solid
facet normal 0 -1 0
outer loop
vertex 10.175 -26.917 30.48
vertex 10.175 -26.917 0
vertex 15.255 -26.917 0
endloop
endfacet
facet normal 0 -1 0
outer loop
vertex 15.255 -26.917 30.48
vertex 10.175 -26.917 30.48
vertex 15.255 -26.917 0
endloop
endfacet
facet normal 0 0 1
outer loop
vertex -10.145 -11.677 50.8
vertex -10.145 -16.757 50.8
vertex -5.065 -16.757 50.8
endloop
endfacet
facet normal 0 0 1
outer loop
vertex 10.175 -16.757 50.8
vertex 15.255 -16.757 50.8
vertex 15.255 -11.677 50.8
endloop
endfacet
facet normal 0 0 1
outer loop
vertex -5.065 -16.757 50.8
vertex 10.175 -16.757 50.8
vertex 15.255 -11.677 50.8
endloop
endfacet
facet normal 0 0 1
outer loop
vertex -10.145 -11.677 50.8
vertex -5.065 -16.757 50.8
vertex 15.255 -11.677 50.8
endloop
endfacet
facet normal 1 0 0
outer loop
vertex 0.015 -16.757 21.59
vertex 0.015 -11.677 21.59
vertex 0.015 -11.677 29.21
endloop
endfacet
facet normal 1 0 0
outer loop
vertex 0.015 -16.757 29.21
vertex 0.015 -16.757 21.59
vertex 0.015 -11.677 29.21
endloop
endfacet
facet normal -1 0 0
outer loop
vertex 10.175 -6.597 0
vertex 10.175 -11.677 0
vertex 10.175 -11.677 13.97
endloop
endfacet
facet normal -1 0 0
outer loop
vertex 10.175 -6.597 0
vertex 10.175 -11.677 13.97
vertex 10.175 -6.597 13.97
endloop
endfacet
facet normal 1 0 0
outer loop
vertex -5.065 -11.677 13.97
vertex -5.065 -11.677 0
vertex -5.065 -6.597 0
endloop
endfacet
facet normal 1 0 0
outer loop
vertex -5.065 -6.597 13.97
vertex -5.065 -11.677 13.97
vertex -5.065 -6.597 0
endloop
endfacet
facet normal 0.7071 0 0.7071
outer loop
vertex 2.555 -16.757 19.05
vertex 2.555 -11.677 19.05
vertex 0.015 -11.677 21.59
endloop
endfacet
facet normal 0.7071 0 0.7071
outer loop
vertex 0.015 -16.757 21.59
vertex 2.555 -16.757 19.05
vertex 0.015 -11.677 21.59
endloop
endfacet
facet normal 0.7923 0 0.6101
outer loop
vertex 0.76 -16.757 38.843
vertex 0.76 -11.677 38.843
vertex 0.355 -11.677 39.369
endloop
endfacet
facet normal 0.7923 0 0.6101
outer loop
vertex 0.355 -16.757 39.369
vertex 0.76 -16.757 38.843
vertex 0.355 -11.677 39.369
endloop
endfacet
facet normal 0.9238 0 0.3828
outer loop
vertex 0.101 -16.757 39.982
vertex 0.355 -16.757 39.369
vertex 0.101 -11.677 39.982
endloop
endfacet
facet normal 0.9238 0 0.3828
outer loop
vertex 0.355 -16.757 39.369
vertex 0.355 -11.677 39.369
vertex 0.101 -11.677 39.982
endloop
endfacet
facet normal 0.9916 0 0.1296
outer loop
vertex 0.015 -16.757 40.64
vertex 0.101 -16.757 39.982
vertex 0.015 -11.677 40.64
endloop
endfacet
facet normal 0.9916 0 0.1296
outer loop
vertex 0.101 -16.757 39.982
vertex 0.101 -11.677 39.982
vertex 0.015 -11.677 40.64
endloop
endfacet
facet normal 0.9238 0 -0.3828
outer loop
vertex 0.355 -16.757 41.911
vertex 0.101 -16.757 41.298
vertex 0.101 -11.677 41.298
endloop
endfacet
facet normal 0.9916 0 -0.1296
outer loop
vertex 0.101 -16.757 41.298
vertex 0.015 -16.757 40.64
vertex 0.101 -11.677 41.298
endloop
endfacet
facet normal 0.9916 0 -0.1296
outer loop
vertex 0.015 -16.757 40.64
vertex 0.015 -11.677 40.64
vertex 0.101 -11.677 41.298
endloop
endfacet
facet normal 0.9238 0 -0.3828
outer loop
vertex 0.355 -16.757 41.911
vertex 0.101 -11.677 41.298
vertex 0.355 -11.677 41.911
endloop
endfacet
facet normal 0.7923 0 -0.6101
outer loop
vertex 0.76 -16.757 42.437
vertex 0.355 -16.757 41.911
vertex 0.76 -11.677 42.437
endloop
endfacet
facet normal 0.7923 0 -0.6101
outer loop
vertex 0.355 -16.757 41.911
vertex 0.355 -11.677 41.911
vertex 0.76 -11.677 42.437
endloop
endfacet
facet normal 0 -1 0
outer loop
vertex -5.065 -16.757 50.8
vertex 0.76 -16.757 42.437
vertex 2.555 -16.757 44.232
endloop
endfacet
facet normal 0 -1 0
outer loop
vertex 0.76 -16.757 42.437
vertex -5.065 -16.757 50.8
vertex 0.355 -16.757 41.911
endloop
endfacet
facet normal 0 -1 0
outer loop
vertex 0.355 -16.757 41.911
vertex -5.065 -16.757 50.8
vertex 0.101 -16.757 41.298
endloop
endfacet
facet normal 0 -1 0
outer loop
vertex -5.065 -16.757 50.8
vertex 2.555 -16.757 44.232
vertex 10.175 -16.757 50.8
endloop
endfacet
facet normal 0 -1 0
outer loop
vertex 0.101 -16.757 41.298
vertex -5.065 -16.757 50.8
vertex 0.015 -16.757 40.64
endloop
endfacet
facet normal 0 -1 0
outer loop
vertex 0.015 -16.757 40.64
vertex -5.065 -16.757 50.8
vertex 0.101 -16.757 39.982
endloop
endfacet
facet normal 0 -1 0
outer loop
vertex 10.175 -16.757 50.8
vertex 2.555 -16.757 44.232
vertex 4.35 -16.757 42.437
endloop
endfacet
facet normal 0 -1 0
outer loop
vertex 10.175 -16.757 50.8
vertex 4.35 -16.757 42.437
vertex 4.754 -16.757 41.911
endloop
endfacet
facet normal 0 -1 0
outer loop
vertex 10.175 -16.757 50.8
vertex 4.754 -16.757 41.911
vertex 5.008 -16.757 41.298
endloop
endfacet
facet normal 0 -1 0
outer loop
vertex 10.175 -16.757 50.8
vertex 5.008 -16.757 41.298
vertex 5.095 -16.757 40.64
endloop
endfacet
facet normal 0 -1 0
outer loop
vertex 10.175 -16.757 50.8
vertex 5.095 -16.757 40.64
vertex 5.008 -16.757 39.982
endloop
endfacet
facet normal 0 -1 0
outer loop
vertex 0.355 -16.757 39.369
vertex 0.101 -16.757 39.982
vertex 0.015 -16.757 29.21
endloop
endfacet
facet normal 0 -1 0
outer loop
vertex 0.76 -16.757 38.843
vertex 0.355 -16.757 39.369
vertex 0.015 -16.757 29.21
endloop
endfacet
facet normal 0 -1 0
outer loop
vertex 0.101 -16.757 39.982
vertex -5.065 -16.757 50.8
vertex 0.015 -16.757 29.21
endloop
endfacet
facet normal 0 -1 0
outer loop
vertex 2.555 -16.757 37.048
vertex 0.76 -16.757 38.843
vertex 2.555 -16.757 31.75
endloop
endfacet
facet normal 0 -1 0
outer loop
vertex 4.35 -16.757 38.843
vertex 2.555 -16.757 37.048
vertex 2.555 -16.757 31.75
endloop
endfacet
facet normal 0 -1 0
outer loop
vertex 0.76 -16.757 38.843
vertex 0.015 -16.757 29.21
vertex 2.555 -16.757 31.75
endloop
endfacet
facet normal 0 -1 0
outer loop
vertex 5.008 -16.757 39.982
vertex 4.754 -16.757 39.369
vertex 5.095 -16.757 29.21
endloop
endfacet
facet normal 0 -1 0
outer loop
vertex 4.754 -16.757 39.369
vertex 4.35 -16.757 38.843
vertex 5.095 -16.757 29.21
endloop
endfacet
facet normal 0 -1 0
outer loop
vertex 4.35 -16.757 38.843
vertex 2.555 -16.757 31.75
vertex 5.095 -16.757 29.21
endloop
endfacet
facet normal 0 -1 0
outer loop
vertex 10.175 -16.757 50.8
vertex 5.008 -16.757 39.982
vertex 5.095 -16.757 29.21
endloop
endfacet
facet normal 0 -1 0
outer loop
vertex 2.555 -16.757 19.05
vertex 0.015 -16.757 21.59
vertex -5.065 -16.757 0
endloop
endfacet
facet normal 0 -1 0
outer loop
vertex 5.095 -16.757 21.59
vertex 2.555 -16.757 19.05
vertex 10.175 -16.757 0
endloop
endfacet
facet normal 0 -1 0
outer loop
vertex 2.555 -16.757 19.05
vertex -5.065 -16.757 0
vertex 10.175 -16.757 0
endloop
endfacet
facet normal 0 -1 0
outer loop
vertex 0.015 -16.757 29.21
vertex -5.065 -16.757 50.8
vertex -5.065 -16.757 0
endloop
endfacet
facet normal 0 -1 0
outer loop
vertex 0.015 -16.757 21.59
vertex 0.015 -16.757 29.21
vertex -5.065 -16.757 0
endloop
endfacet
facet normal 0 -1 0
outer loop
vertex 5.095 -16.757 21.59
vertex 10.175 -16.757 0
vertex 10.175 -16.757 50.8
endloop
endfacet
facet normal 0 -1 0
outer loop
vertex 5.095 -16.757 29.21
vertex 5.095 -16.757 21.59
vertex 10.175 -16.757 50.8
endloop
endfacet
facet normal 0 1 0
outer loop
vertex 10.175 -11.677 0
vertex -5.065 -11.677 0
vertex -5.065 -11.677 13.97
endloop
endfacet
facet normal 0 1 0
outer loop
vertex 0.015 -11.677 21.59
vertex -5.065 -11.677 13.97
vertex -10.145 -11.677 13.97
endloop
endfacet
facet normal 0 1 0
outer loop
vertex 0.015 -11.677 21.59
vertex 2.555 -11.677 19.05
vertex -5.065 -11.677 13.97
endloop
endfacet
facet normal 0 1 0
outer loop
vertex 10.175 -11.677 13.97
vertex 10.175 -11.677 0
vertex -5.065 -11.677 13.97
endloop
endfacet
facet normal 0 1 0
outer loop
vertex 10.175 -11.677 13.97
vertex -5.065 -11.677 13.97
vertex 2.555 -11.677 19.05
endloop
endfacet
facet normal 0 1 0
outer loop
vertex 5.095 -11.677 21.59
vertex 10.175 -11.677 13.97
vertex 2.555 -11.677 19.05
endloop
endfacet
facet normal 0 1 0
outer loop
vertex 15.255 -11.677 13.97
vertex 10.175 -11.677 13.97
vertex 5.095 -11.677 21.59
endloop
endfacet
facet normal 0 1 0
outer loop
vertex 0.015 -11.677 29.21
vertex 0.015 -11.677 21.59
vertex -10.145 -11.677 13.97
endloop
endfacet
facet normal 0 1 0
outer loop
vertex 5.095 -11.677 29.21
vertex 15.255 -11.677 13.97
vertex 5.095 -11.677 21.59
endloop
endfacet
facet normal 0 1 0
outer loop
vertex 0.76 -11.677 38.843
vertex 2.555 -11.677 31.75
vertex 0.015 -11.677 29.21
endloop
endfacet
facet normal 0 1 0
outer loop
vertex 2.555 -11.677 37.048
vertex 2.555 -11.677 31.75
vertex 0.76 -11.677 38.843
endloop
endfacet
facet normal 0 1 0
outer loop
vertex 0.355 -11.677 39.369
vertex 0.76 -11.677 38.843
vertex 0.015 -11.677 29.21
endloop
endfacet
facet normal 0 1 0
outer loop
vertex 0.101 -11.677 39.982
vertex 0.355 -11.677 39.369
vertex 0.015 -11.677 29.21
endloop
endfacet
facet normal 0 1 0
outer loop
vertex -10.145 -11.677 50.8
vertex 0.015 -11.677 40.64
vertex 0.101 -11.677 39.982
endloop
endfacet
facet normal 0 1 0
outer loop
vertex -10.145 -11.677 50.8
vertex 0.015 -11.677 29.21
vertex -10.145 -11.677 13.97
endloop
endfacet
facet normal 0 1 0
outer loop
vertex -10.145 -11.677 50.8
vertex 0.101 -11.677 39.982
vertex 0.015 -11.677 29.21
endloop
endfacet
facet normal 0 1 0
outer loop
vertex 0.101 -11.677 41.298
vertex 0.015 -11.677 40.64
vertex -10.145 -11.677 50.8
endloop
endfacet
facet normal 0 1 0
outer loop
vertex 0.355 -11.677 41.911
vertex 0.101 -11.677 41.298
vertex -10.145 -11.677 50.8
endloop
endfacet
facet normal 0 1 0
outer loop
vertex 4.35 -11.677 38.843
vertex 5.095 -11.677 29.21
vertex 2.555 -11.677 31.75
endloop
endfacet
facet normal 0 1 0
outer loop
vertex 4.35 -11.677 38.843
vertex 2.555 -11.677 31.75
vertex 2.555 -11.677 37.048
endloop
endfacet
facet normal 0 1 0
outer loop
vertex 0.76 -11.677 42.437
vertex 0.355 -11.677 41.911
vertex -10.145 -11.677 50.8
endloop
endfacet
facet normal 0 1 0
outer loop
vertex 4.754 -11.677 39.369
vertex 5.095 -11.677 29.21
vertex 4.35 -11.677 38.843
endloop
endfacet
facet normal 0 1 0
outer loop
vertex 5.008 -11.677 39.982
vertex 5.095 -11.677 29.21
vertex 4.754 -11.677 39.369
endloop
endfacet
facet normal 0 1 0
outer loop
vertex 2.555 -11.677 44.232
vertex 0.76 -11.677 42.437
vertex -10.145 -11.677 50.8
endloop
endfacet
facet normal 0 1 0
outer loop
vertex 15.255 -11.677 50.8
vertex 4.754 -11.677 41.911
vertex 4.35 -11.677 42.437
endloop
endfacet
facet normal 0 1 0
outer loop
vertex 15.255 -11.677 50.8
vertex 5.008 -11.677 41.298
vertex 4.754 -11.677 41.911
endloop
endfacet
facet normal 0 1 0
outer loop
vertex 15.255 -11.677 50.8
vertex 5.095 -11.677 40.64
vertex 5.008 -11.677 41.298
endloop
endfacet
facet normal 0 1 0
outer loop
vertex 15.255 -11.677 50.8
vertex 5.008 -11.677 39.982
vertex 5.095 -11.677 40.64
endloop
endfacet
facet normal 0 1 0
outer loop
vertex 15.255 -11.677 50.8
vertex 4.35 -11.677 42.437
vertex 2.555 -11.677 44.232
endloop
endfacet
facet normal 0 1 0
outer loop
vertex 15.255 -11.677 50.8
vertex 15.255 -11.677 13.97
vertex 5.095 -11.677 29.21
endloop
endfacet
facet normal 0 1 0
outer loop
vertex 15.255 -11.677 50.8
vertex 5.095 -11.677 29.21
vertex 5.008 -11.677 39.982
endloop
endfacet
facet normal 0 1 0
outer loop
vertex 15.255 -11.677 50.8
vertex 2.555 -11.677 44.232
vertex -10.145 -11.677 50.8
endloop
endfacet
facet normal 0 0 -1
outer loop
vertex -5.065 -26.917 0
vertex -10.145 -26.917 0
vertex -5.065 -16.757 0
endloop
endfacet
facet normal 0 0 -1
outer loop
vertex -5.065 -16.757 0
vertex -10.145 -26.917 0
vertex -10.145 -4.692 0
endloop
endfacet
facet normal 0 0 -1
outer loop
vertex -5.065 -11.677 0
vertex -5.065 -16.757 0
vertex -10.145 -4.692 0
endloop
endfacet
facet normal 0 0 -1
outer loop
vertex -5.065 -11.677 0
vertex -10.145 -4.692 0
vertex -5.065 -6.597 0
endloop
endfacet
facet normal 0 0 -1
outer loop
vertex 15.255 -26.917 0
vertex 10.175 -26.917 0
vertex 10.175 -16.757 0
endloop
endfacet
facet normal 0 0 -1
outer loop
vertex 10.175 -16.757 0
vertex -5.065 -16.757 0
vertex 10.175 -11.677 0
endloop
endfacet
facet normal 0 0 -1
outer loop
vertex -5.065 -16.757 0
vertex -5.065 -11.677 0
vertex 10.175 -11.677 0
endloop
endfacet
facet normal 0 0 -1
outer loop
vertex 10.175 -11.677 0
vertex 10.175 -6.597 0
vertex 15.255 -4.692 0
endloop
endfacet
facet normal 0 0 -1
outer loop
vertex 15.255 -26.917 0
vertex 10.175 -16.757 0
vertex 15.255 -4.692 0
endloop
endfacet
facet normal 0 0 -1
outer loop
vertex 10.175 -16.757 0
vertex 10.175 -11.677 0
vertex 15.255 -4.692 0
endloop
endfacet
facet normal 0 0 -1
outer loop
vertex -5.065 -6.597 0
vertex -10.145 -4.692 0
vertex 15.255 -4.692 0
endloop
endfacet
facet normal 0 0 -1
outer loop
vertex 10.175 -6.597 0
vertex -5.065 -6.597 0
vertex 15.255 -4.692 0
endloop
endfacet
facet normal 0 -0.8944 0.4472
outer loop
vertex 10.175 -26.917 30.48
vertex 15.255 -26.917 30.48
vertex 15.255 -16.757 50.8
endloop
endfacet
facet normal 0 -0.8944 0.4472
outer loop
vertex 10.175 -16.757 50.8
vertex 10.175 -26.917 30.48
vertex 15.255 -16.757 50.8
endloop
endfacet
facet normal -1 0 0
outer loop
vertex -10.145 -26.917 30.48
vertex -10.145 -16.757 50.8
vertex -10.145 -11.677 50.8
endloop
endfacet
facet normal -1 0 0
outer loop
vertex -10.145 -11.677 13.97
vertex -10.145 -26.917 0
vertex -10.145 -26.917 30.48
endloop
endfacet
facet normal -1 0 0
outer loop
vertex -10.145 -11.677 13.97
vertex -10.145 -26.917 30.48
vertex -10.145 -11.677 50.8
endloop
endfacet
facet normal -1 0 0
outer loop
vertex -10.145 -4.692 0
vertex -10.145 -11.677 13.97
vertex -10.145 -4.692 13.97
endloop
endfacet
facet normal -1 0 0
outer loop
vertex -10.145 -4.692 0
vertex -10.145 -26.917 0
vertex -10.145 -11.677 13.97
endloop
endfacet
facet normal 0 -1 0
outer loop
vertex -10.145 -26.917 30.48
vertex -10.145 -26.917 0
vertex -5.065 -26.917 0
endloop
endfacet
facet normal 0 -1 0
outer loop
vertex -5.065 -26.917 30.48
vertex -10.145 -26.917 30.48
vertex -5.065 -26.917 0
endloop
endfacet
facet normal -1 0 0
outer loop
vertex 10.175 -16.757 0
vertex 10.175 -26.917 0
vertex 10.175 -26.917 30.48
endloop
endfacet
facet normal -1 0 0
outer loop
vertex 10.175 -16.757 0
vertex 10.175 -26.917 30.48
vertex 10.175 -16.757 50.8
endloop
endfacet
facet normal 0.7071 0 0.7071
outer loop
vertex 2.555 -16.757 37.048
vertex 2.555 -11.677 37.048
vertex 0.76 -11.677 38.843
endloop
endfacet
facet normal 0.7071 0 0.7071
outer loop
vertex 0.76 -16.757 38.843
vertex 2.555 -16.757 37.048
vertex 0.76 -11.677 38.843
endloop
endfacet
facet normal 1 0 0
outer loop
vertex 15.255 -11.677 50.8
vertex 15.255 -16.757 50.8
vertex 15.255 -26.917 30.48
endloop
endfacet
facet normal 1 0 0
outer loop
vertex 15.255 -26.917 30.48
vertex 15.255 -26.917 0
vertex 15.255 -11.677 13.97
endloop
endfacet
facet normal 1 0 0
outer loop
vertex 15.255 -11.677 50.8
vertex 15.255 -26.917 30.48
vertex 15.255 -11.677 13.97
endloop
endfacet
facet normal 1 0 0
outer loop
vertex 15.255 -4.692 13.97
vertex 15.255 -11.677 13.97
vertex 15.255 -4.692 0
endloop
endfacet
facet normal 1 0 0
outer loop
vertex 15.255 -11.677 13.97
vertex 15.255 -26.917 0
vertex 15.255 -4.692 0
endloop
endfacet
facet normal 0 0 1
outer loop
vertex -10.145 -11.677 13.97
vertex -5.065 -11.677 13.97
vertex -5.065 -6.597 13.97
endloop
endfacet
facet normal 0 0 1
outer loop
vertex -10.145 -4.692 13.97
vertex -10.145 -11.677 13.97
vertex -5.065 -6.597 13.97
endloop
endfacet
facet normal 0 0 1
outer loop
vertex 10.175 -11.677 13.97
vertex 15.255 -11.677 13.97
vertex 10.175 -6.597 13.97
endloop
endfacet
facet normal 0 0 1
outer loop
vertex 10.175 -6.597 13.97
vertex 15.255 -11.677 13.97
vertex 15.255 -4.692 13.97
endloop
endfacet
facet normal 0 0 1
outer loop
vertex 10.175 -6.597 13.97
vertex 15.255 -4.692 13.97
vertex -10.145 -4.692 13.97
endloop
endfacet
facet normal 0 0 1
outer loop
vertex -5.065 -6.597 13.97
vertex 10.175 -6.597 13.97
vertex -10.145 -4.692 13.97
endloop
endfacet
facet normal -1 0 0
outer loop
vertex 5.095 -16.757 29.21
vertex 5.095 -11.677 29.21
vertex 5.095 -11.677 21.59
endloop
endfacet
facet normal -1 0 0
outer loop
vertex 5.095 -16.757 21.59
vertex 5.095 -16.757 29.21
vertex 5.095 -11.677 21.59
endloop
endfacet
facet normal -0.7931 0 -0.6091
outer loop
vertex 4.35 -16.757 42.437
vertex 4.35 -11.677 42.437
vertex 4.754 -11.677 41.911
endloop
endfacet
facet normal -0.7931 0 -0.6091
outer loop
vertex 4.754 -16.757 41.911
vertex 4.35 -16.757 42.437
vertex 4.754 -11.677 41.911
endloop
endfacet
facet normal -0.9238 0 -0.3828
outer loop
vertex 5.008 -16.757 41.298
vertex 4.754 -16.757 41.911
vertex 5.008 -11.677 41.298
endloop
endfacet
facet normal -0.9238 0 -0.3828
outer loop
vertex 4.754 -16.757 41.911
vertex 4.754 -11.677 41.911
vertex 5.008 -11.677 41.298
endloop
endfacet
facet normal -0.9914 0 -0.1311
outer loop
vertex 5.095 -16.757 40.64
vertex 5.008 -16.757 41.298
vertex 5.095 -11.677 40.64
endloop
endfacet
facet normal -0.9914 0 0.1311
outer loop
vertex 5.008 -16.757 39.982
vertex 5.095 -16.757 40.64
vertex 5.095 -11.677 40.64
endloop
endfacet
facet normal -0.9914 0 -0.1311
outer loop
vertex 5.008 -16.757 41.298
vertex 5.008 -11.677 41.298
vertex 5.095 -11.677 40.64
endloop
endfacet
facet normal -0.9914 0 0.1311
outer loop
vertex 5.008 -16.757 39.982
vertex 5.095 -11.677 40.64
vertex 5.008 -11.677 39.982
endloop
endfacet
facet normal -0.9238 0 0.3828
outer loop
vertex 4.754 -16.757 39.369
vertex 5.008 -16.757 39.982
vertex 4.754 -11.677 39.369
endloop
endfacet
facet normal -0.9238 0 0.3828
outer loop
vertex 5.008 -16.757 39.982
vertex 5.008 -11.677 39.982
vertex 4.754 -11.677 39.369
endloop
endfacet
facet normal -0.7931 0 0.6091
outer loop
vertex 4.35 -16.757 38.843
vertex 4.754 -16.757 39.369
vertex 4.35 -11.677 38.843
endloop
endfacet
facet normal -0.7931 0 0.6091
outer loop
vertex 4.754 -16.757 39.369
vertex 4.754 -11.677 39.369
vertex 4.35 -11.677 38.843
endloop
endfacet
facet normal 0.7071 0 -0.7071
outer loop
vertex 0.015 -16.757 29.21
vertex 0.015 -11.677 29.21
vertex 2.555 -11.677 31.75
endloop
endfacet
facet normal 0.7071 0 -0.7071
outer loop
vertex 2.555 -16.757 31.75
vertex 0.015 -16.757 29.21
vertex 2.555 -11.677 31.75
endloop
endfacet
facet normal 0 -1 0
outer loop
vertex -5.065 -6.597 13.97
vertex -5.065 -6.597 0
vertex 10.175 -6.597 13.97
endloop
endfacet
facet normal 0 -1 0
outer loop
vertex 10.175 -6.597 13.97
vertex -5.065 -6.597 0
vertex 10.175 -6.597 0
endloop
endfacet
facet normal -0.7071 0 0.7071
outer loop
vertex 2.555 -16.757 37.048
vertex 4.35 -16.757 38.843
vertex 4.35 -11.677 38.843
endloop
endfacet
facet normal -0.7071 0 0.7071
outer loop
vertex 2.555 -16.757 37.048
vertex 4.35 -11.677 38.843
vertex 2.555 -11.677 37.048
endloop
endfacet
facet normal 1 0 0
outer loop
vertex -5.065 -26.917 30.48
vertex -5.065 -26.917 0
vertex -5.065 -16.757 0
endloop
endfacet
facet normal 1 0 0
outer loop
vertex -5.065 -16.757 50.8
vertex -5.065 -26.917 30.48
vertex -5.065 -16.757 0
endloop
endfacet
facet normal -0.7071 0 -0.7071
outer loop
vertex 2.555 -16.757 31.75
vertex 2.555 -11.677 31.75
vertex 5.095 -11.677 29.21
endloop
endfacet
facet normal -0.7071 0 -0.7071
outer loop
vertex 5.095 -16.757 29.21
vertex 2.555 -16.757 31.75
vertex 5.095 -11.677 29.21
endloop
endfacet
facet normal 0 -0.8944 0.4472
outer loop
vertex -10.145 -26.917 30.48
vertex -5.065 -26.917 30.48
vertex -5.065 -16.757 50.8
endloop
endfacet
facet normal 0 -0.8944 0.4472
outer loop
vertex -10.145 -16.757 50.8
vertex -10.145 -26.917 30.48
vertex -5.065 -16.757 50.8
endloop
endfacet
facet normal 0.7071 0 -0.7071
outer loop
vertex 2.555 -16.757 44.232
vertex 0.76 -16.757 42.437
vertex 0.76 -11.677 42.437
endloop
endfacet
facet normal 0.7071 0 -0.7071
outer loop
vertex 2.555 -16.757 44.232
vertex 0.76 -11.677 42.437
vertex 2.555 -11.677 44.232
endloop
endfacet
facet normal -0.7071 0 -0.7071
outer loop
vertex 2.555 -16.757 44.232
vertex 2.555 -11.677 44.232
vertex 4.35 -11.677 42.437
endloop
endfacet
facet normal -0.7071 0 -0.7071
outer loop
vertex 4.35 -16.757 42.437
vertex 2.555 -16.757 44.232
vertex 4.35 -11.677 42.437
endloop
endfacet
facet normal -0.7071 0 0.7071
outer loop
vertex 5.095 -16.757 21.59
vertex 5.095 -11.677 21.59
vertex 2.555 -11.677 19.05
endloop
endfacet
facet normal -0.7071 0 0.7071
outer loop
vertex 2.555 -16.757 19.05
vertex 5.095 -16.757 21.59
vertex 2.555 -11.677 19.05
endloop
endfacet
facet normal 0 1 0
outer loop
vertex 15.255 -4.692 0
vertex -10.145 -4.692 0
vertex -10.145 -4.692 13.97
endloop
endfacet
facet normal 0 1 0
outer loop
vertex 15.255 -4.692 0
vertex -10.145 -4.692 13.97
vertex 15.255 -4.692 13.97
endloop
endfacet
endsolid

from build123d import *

# Parameters (mm, degrees)
F0_W      = 25.4
F0_H      = 12.065
F0_W_2    = 15.24
F0_H_2    = 5.08
F1_DEPTH  = 101.6
F6_W      = 5.08
F6_H      = 10.16
F2_DEPTH  = 101.6
F3_W      = 6.985
F3_H      = 87.63
F7_DEPTH  = 25.4
F8_DEPTH  = 25.4
F9_R      = 2.54
F5_DEPTH  = 5.08
F11_DEPTH = 5.08


with BuildPart() as f1:
    # F0 (on Top) → F1 (new body)
    with BuildSketch(Plane.XY):
        with Locations((2.554662, -10.724223)):
            Rectangle(F0_W, F0_H)
        with Locations((2.554662, -9.136723)):
            Rectangle(F0_W_2, F0_H_2, mode=Mode.SUBTRACT)
    extrude(amount=F1_DEPTH)

    # F6 (on Top) → F2 (join, through all)
    with BuildSketch(Plane.XY):
        with Locations((-7.605338, -21.836723)):
            Rectangle(F6_W, F6_H)
        with Locations((12.714662, -21.836723)):
            Rectangle(F6_W, F6_H)
    extrude(amount=F2_DEPTH)

    # F3 (on face) → F7 (cut, through all)
    with BuildSketch(Plane.YZ.offset(15.254662)):
        with Locations((-8.184223, 57.785)):
            Rectangle(F3_W, F3_H)
    extrude(amount=-F7_DEPTH, mode=Mode.SUBTRACT)

    # F4 (on face) → F8 (cut, through all)
    with BuildSketch(Plane.YZ.offset(15.254662)):
        Polygon((-11.676723, 101.6), (-26.916723, 101.6), (-26.916723, 30.48), (-16.756723, 50.8), (-11.676723, 50.8), align=None)
    extrude(amount=-F8_DEPTH, mode=Mode.SUBTRACT)

    # F9 (on face) → F5 (cut, through all)
    with BuildSketch(Plane(origin=(0, -11.676723, 0), x_dir=(-1, 0, 0), z_dir=(0, 1, 0))):
        with Locations((-2.554662, 40.64)):
            Circle(F9_R)
        with Locations((-2.554662, 25.4)):
            Circle(F9_R)
    extrude(amount=-F5_DEPTH, mode=Mode.SUBTRACT)

    # F10 (on face) → F11 (cut, through all)
    with BuildSketch(Plane(origin=(0, -11.676723, 0), x_dir=(-1, 0, 0), z_dir=(0, 1, 0))):
        Polygon((-0.014662, 21.59), (-0.014662, 29.21), (-2.554662, 31.75), (-5.094662, 29.21), (-5.094662, 21.59), (-2.554662, 19.05), align=None)
        Polygon((-2.554662, 44.232102), (-4.350713, 42.436051), (-0.758611, 42.436051), align=None)
        Polygon((-0.758611, 38.843949), (-4.350713, 38.843949), (-2.554662, 37.047898), align=None)
    extrude(amount=-F11_DEPTH, mode=Mode.SUBTRACT)


solid = f1.part
